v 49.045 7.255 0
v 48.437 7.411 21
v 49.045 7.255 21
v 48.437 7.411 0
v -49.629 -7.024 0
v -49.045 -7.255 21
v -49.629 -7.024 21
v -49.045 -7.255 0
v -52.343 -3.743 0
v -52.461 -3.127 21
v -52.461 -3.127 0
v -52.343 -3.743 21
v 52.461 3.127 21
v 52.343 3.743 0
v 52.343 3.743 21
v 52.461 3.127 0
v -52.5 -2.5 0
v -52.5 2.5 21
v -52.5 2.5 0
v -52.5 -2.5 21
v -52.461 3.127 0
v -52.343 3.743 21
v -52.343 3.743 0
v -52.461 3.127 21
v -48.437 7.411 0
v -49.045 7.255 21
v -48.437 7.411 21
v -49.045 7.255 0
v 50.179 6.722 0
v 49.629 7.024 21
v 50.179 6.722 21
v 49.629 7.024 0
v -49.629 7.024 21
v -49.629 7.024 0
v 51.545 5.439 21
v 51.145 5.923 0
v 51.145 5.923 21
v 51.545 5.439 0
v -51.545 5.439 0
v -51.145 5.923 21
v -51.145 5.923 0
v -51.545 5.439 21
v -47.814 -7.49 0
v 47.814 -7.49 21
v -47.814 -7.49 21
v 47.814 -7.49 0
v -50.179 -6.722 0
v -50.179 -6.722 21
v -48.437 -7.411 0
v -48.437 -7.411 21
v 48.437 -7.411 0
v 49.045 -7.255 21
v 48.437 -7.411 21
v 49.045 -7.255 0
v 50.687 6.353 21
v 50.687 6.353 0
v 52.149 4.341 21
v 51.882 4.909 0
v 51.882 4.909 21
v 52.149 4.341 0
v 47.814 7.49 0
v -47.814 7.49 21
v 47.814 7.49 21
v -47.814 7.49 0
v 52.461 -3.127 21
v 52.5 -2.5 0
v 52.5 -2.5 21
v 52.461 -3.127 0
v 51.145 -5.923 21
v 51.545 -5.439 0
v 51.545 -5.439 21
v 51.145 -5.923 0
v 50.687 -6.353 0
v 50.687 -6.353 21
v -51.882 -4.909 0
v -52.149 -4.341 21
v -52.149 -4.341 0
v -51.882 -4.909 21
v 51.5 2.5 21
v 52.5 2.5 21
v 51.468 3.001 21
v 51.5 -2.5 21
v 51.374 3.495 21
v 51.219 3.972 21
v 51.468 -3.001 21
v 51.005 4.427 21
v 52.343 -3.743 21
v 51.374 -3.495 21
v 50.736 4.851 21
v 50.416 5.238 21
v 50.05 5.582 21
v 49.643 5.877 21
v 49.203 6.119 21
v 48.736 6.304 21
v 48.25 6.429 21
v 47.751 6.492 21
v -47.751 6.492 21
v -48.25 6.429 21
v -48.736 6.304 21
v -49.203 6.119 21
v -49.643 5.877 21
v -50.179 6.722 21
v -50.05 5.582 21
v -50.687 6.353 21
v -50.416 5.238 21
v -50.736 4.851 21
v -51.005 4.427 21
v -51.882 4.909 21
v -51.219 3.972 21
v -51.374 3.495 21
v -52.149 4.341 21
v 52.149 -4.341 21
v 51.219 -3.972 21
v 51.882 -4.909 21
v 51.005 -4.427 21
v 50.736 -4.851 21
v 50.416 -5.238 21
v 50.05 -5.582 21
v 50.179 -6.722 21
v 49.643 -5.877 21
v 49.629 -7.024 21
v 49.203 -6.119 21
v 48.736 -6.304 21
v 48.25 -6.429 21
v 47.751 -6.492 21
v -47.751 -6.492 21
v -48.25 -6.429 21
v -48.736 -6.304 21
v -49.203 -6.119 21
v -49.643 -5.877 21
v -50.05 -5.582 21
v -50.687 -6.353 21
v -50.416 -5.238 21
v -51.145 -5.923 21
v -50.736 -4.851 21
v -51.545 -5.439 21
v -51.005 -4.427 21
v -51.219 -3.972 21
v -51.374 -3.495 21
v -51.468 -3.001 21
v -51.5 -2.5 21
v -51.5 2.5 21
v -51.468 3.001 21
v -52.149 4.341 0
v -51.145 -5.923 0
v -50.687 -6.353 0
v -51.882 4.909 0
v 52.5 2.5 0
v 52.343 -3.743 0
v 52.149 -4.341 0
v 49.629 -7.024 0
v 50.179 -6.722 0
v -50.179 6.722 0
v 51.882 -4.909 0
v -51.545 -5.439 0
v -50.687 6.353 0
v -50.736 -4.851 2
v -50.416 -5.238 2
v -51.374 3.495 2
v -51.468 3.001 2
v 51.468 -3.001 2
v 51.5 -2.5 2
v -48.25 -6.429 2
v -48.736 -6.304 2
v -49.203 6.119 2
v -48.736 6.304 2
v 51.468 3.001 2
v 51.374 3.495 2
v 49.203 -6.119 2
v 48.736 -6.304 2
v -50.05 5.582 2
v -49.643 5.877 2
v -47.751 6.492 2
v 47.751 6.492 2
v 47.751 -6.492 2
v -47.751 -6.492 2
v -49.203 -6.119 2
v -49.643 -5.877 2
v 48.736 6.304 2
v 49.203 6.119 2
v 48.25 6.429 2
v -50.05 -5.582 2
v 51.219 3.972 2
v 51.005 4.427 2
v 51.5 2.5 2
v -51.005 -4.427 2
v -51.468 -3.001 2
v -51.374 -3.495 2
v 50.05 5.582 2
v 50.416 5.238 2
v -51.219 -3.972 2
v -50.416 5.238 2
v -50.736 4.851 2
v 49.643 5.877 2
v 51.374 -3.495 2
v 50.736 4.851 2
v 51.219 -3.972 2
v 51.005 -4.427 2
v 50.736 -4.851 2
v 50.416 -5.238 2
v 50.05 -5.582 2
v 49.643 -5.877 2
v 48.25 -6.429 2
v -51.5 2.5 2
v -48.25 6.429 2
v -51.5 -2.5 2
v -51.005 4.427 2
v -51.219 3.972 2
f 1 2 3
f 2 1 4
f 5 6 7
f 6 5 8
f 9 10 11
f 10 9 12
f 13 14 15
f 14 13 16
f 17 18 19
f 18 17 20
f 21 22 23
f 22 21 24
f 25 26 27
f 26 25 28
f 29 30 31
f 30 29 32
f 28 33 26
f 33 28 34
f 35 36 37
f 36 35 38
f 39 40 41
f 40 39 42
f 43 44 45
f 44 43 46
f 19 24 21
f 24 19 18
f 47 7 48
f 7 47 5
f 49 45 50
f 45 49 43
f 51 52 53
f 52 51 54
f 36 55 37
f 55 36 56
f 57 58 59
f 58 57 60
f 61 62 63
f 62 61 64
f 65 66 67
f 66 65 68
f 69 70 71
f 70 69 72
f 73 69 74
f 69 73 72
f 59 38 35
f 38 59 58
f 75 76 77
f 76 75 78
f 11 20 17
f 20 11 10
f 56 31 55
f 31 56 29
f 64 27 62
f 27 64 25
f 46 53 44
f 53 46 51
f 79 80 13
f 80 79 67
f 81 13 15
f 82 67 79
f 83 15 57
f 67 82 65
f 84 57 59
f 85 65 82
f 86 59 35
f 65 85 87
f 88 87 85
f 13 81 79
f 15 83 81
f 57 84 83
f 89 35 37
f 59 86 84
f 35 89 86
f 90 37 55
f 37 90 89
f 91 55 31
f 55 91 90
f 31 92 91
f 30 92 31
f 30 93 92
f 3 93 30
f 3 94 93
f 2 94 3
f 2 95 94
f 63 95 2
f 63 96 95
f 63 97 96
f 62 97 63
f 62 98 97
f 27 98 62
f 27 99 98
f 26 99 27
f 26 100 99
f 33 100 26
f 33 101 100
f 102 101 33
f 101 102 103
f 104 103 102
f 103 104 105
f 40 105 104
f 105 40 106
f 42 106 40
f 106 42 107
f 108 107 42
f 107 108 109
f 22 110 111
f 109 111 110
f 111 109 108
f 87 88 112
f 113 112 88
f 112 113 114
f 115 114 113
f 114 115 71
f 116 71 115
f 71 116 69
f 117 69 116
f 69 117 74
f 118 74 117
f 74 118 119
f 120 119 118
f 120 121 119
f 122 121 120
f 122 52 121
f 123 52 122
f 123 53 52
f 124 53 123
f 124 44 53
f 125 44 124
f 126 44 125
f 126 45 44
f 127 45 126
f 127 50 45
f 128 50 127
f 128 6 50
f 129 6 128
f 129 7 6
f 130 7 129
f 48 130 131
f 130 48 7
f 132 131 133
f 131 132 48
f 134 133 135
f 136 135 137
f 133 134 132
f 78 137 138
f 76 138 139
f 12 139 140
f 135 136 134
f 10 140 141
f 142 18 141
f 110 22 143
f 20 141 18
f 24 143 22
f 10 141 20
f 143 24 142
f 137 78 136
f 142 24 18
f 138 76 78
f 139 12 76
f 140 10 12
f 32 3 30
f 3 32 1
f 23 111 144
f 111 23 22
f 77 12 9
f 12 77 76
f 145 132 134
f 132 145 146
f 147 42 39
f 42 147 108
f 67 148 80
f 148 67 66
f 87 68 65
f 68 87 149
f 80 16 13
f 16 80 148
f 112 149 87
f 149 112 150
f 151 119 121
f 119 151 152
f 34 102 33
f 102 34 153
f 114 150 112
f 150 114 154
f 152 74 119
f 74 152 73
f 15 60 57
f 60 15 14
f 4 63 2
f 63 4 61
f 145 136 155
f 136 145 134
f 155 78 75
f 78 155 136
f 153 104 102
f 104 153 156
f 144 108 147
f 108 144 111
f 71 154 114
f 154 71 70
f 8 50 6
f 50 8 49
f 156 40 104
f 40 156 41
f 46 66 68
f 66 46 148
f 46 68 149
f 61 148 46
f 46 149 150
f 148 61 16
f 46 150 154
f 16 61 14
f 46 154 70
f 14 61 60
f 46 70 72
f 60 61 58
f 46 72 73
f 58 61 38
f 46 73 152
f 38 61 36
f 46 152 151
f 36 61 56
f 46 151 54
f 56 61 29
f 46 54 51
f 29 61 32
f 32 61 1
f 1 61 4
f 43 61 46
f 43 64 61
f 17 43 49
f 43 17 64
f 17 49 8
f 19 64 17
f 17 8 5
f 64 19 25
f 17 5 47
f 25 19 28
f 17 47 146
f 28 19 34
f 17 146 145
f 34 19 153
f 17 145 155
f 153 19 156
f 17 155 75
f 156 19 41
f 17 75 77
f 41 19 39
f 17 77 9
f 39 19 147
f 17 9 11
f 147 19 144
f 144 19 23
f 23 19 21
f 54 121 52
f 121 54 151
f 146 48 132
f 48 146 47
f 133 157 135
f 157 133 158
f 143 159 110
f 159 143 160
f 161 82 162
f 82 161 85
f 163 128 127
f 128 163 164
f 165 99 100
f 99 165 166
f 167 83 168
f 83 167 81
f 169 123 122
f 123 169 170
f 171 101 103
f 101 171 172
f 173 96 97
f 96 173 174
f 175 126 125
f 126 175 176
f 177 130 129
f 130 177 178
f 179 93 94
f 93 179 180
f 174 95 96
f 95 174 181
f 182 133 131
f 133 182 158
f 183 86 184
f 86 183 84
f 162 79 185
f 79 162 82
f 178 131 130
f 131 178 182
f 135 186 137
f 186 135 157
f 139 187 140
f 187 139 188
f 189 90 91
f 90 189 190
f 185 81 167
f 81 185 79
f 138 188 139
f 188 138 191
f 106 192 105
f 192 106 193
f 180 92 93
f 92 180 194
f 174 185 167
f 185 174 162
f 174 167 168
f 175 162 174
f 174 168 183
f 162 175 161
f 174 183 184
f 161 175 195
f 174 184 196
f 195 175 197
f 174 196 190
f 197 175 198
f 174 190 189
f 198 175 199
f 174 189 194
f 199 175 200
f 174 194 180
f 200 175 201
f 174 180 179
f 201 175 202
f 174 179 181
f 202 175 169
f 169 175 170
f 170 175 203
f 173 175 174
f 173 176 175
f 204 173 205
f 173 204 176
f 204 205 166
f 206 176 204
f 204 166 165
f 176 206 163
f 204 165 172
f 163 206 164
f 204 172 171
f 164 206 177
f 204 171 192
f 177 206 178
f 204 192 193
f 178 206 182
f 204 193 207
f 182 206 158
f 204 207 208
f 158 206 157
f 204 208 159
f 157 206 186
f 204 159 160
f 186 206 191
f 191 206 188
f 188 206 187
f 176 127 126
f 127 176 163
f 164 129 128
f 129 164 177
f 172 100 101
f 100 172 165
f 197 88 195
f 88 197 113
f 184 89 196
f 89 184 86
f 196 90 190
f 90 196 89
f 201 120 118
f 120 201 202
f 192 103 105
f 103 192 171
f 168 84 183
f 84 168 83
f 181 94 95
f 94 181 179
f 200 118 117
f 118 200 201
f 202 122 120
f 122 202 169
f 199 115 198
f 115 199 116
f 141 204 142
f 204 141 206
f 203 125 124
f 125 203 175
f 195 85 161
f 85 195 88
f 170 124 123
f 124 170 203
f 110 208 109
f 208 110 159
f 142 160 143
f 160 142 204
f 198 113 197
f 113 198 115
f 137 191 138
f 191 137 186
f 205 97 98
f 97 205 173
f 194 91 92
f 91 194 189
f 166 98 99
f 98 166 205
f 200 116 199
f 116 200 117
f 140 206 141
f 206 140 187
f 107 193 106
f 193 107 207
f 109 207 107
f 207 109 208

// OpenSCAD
$fn = 50;


difference() {
	union() {
		hull() {
			translate(v = [-47.5000000000, 2.5000000000, 0]) {
				cylinder(h = 21, r = 5);
			}
			translate(v = [47.5000000000, 2.5000000000, 0]) {
				cylinder(h = 21, r = 5);
			}
			translate(v = [-47.5000000000, -2.5000000000, 0]) {
				cylinder(h = 21, r = 5);
			}
			translate(v = [47.5000000000, -2.5000000000, 0]) {
				cylinder(h = 21, r = 5);
			}
		}
	}
	union() {
		translate(v = [0, 0, 2]) {
			hull() {
				translate(v = [-47.5000000000, 2.5000000000, 0]) {
					cylinder(h = 19, r = 4);
				}
				translate(v = [47.5000000000, 2.5000000000, 0]) {
					cylinder(h = 19, r = 4);
				}
				translate(v = [-47.5000000000, -2.5000000000, 0]) {
					cylinder(h = 19, r = 4);
				}
				translate(v = [47.5000000000, -2.5000000000, 0]) {
					cylinder(h = 19, r = 4);
				}
			}
		}
	}
}
